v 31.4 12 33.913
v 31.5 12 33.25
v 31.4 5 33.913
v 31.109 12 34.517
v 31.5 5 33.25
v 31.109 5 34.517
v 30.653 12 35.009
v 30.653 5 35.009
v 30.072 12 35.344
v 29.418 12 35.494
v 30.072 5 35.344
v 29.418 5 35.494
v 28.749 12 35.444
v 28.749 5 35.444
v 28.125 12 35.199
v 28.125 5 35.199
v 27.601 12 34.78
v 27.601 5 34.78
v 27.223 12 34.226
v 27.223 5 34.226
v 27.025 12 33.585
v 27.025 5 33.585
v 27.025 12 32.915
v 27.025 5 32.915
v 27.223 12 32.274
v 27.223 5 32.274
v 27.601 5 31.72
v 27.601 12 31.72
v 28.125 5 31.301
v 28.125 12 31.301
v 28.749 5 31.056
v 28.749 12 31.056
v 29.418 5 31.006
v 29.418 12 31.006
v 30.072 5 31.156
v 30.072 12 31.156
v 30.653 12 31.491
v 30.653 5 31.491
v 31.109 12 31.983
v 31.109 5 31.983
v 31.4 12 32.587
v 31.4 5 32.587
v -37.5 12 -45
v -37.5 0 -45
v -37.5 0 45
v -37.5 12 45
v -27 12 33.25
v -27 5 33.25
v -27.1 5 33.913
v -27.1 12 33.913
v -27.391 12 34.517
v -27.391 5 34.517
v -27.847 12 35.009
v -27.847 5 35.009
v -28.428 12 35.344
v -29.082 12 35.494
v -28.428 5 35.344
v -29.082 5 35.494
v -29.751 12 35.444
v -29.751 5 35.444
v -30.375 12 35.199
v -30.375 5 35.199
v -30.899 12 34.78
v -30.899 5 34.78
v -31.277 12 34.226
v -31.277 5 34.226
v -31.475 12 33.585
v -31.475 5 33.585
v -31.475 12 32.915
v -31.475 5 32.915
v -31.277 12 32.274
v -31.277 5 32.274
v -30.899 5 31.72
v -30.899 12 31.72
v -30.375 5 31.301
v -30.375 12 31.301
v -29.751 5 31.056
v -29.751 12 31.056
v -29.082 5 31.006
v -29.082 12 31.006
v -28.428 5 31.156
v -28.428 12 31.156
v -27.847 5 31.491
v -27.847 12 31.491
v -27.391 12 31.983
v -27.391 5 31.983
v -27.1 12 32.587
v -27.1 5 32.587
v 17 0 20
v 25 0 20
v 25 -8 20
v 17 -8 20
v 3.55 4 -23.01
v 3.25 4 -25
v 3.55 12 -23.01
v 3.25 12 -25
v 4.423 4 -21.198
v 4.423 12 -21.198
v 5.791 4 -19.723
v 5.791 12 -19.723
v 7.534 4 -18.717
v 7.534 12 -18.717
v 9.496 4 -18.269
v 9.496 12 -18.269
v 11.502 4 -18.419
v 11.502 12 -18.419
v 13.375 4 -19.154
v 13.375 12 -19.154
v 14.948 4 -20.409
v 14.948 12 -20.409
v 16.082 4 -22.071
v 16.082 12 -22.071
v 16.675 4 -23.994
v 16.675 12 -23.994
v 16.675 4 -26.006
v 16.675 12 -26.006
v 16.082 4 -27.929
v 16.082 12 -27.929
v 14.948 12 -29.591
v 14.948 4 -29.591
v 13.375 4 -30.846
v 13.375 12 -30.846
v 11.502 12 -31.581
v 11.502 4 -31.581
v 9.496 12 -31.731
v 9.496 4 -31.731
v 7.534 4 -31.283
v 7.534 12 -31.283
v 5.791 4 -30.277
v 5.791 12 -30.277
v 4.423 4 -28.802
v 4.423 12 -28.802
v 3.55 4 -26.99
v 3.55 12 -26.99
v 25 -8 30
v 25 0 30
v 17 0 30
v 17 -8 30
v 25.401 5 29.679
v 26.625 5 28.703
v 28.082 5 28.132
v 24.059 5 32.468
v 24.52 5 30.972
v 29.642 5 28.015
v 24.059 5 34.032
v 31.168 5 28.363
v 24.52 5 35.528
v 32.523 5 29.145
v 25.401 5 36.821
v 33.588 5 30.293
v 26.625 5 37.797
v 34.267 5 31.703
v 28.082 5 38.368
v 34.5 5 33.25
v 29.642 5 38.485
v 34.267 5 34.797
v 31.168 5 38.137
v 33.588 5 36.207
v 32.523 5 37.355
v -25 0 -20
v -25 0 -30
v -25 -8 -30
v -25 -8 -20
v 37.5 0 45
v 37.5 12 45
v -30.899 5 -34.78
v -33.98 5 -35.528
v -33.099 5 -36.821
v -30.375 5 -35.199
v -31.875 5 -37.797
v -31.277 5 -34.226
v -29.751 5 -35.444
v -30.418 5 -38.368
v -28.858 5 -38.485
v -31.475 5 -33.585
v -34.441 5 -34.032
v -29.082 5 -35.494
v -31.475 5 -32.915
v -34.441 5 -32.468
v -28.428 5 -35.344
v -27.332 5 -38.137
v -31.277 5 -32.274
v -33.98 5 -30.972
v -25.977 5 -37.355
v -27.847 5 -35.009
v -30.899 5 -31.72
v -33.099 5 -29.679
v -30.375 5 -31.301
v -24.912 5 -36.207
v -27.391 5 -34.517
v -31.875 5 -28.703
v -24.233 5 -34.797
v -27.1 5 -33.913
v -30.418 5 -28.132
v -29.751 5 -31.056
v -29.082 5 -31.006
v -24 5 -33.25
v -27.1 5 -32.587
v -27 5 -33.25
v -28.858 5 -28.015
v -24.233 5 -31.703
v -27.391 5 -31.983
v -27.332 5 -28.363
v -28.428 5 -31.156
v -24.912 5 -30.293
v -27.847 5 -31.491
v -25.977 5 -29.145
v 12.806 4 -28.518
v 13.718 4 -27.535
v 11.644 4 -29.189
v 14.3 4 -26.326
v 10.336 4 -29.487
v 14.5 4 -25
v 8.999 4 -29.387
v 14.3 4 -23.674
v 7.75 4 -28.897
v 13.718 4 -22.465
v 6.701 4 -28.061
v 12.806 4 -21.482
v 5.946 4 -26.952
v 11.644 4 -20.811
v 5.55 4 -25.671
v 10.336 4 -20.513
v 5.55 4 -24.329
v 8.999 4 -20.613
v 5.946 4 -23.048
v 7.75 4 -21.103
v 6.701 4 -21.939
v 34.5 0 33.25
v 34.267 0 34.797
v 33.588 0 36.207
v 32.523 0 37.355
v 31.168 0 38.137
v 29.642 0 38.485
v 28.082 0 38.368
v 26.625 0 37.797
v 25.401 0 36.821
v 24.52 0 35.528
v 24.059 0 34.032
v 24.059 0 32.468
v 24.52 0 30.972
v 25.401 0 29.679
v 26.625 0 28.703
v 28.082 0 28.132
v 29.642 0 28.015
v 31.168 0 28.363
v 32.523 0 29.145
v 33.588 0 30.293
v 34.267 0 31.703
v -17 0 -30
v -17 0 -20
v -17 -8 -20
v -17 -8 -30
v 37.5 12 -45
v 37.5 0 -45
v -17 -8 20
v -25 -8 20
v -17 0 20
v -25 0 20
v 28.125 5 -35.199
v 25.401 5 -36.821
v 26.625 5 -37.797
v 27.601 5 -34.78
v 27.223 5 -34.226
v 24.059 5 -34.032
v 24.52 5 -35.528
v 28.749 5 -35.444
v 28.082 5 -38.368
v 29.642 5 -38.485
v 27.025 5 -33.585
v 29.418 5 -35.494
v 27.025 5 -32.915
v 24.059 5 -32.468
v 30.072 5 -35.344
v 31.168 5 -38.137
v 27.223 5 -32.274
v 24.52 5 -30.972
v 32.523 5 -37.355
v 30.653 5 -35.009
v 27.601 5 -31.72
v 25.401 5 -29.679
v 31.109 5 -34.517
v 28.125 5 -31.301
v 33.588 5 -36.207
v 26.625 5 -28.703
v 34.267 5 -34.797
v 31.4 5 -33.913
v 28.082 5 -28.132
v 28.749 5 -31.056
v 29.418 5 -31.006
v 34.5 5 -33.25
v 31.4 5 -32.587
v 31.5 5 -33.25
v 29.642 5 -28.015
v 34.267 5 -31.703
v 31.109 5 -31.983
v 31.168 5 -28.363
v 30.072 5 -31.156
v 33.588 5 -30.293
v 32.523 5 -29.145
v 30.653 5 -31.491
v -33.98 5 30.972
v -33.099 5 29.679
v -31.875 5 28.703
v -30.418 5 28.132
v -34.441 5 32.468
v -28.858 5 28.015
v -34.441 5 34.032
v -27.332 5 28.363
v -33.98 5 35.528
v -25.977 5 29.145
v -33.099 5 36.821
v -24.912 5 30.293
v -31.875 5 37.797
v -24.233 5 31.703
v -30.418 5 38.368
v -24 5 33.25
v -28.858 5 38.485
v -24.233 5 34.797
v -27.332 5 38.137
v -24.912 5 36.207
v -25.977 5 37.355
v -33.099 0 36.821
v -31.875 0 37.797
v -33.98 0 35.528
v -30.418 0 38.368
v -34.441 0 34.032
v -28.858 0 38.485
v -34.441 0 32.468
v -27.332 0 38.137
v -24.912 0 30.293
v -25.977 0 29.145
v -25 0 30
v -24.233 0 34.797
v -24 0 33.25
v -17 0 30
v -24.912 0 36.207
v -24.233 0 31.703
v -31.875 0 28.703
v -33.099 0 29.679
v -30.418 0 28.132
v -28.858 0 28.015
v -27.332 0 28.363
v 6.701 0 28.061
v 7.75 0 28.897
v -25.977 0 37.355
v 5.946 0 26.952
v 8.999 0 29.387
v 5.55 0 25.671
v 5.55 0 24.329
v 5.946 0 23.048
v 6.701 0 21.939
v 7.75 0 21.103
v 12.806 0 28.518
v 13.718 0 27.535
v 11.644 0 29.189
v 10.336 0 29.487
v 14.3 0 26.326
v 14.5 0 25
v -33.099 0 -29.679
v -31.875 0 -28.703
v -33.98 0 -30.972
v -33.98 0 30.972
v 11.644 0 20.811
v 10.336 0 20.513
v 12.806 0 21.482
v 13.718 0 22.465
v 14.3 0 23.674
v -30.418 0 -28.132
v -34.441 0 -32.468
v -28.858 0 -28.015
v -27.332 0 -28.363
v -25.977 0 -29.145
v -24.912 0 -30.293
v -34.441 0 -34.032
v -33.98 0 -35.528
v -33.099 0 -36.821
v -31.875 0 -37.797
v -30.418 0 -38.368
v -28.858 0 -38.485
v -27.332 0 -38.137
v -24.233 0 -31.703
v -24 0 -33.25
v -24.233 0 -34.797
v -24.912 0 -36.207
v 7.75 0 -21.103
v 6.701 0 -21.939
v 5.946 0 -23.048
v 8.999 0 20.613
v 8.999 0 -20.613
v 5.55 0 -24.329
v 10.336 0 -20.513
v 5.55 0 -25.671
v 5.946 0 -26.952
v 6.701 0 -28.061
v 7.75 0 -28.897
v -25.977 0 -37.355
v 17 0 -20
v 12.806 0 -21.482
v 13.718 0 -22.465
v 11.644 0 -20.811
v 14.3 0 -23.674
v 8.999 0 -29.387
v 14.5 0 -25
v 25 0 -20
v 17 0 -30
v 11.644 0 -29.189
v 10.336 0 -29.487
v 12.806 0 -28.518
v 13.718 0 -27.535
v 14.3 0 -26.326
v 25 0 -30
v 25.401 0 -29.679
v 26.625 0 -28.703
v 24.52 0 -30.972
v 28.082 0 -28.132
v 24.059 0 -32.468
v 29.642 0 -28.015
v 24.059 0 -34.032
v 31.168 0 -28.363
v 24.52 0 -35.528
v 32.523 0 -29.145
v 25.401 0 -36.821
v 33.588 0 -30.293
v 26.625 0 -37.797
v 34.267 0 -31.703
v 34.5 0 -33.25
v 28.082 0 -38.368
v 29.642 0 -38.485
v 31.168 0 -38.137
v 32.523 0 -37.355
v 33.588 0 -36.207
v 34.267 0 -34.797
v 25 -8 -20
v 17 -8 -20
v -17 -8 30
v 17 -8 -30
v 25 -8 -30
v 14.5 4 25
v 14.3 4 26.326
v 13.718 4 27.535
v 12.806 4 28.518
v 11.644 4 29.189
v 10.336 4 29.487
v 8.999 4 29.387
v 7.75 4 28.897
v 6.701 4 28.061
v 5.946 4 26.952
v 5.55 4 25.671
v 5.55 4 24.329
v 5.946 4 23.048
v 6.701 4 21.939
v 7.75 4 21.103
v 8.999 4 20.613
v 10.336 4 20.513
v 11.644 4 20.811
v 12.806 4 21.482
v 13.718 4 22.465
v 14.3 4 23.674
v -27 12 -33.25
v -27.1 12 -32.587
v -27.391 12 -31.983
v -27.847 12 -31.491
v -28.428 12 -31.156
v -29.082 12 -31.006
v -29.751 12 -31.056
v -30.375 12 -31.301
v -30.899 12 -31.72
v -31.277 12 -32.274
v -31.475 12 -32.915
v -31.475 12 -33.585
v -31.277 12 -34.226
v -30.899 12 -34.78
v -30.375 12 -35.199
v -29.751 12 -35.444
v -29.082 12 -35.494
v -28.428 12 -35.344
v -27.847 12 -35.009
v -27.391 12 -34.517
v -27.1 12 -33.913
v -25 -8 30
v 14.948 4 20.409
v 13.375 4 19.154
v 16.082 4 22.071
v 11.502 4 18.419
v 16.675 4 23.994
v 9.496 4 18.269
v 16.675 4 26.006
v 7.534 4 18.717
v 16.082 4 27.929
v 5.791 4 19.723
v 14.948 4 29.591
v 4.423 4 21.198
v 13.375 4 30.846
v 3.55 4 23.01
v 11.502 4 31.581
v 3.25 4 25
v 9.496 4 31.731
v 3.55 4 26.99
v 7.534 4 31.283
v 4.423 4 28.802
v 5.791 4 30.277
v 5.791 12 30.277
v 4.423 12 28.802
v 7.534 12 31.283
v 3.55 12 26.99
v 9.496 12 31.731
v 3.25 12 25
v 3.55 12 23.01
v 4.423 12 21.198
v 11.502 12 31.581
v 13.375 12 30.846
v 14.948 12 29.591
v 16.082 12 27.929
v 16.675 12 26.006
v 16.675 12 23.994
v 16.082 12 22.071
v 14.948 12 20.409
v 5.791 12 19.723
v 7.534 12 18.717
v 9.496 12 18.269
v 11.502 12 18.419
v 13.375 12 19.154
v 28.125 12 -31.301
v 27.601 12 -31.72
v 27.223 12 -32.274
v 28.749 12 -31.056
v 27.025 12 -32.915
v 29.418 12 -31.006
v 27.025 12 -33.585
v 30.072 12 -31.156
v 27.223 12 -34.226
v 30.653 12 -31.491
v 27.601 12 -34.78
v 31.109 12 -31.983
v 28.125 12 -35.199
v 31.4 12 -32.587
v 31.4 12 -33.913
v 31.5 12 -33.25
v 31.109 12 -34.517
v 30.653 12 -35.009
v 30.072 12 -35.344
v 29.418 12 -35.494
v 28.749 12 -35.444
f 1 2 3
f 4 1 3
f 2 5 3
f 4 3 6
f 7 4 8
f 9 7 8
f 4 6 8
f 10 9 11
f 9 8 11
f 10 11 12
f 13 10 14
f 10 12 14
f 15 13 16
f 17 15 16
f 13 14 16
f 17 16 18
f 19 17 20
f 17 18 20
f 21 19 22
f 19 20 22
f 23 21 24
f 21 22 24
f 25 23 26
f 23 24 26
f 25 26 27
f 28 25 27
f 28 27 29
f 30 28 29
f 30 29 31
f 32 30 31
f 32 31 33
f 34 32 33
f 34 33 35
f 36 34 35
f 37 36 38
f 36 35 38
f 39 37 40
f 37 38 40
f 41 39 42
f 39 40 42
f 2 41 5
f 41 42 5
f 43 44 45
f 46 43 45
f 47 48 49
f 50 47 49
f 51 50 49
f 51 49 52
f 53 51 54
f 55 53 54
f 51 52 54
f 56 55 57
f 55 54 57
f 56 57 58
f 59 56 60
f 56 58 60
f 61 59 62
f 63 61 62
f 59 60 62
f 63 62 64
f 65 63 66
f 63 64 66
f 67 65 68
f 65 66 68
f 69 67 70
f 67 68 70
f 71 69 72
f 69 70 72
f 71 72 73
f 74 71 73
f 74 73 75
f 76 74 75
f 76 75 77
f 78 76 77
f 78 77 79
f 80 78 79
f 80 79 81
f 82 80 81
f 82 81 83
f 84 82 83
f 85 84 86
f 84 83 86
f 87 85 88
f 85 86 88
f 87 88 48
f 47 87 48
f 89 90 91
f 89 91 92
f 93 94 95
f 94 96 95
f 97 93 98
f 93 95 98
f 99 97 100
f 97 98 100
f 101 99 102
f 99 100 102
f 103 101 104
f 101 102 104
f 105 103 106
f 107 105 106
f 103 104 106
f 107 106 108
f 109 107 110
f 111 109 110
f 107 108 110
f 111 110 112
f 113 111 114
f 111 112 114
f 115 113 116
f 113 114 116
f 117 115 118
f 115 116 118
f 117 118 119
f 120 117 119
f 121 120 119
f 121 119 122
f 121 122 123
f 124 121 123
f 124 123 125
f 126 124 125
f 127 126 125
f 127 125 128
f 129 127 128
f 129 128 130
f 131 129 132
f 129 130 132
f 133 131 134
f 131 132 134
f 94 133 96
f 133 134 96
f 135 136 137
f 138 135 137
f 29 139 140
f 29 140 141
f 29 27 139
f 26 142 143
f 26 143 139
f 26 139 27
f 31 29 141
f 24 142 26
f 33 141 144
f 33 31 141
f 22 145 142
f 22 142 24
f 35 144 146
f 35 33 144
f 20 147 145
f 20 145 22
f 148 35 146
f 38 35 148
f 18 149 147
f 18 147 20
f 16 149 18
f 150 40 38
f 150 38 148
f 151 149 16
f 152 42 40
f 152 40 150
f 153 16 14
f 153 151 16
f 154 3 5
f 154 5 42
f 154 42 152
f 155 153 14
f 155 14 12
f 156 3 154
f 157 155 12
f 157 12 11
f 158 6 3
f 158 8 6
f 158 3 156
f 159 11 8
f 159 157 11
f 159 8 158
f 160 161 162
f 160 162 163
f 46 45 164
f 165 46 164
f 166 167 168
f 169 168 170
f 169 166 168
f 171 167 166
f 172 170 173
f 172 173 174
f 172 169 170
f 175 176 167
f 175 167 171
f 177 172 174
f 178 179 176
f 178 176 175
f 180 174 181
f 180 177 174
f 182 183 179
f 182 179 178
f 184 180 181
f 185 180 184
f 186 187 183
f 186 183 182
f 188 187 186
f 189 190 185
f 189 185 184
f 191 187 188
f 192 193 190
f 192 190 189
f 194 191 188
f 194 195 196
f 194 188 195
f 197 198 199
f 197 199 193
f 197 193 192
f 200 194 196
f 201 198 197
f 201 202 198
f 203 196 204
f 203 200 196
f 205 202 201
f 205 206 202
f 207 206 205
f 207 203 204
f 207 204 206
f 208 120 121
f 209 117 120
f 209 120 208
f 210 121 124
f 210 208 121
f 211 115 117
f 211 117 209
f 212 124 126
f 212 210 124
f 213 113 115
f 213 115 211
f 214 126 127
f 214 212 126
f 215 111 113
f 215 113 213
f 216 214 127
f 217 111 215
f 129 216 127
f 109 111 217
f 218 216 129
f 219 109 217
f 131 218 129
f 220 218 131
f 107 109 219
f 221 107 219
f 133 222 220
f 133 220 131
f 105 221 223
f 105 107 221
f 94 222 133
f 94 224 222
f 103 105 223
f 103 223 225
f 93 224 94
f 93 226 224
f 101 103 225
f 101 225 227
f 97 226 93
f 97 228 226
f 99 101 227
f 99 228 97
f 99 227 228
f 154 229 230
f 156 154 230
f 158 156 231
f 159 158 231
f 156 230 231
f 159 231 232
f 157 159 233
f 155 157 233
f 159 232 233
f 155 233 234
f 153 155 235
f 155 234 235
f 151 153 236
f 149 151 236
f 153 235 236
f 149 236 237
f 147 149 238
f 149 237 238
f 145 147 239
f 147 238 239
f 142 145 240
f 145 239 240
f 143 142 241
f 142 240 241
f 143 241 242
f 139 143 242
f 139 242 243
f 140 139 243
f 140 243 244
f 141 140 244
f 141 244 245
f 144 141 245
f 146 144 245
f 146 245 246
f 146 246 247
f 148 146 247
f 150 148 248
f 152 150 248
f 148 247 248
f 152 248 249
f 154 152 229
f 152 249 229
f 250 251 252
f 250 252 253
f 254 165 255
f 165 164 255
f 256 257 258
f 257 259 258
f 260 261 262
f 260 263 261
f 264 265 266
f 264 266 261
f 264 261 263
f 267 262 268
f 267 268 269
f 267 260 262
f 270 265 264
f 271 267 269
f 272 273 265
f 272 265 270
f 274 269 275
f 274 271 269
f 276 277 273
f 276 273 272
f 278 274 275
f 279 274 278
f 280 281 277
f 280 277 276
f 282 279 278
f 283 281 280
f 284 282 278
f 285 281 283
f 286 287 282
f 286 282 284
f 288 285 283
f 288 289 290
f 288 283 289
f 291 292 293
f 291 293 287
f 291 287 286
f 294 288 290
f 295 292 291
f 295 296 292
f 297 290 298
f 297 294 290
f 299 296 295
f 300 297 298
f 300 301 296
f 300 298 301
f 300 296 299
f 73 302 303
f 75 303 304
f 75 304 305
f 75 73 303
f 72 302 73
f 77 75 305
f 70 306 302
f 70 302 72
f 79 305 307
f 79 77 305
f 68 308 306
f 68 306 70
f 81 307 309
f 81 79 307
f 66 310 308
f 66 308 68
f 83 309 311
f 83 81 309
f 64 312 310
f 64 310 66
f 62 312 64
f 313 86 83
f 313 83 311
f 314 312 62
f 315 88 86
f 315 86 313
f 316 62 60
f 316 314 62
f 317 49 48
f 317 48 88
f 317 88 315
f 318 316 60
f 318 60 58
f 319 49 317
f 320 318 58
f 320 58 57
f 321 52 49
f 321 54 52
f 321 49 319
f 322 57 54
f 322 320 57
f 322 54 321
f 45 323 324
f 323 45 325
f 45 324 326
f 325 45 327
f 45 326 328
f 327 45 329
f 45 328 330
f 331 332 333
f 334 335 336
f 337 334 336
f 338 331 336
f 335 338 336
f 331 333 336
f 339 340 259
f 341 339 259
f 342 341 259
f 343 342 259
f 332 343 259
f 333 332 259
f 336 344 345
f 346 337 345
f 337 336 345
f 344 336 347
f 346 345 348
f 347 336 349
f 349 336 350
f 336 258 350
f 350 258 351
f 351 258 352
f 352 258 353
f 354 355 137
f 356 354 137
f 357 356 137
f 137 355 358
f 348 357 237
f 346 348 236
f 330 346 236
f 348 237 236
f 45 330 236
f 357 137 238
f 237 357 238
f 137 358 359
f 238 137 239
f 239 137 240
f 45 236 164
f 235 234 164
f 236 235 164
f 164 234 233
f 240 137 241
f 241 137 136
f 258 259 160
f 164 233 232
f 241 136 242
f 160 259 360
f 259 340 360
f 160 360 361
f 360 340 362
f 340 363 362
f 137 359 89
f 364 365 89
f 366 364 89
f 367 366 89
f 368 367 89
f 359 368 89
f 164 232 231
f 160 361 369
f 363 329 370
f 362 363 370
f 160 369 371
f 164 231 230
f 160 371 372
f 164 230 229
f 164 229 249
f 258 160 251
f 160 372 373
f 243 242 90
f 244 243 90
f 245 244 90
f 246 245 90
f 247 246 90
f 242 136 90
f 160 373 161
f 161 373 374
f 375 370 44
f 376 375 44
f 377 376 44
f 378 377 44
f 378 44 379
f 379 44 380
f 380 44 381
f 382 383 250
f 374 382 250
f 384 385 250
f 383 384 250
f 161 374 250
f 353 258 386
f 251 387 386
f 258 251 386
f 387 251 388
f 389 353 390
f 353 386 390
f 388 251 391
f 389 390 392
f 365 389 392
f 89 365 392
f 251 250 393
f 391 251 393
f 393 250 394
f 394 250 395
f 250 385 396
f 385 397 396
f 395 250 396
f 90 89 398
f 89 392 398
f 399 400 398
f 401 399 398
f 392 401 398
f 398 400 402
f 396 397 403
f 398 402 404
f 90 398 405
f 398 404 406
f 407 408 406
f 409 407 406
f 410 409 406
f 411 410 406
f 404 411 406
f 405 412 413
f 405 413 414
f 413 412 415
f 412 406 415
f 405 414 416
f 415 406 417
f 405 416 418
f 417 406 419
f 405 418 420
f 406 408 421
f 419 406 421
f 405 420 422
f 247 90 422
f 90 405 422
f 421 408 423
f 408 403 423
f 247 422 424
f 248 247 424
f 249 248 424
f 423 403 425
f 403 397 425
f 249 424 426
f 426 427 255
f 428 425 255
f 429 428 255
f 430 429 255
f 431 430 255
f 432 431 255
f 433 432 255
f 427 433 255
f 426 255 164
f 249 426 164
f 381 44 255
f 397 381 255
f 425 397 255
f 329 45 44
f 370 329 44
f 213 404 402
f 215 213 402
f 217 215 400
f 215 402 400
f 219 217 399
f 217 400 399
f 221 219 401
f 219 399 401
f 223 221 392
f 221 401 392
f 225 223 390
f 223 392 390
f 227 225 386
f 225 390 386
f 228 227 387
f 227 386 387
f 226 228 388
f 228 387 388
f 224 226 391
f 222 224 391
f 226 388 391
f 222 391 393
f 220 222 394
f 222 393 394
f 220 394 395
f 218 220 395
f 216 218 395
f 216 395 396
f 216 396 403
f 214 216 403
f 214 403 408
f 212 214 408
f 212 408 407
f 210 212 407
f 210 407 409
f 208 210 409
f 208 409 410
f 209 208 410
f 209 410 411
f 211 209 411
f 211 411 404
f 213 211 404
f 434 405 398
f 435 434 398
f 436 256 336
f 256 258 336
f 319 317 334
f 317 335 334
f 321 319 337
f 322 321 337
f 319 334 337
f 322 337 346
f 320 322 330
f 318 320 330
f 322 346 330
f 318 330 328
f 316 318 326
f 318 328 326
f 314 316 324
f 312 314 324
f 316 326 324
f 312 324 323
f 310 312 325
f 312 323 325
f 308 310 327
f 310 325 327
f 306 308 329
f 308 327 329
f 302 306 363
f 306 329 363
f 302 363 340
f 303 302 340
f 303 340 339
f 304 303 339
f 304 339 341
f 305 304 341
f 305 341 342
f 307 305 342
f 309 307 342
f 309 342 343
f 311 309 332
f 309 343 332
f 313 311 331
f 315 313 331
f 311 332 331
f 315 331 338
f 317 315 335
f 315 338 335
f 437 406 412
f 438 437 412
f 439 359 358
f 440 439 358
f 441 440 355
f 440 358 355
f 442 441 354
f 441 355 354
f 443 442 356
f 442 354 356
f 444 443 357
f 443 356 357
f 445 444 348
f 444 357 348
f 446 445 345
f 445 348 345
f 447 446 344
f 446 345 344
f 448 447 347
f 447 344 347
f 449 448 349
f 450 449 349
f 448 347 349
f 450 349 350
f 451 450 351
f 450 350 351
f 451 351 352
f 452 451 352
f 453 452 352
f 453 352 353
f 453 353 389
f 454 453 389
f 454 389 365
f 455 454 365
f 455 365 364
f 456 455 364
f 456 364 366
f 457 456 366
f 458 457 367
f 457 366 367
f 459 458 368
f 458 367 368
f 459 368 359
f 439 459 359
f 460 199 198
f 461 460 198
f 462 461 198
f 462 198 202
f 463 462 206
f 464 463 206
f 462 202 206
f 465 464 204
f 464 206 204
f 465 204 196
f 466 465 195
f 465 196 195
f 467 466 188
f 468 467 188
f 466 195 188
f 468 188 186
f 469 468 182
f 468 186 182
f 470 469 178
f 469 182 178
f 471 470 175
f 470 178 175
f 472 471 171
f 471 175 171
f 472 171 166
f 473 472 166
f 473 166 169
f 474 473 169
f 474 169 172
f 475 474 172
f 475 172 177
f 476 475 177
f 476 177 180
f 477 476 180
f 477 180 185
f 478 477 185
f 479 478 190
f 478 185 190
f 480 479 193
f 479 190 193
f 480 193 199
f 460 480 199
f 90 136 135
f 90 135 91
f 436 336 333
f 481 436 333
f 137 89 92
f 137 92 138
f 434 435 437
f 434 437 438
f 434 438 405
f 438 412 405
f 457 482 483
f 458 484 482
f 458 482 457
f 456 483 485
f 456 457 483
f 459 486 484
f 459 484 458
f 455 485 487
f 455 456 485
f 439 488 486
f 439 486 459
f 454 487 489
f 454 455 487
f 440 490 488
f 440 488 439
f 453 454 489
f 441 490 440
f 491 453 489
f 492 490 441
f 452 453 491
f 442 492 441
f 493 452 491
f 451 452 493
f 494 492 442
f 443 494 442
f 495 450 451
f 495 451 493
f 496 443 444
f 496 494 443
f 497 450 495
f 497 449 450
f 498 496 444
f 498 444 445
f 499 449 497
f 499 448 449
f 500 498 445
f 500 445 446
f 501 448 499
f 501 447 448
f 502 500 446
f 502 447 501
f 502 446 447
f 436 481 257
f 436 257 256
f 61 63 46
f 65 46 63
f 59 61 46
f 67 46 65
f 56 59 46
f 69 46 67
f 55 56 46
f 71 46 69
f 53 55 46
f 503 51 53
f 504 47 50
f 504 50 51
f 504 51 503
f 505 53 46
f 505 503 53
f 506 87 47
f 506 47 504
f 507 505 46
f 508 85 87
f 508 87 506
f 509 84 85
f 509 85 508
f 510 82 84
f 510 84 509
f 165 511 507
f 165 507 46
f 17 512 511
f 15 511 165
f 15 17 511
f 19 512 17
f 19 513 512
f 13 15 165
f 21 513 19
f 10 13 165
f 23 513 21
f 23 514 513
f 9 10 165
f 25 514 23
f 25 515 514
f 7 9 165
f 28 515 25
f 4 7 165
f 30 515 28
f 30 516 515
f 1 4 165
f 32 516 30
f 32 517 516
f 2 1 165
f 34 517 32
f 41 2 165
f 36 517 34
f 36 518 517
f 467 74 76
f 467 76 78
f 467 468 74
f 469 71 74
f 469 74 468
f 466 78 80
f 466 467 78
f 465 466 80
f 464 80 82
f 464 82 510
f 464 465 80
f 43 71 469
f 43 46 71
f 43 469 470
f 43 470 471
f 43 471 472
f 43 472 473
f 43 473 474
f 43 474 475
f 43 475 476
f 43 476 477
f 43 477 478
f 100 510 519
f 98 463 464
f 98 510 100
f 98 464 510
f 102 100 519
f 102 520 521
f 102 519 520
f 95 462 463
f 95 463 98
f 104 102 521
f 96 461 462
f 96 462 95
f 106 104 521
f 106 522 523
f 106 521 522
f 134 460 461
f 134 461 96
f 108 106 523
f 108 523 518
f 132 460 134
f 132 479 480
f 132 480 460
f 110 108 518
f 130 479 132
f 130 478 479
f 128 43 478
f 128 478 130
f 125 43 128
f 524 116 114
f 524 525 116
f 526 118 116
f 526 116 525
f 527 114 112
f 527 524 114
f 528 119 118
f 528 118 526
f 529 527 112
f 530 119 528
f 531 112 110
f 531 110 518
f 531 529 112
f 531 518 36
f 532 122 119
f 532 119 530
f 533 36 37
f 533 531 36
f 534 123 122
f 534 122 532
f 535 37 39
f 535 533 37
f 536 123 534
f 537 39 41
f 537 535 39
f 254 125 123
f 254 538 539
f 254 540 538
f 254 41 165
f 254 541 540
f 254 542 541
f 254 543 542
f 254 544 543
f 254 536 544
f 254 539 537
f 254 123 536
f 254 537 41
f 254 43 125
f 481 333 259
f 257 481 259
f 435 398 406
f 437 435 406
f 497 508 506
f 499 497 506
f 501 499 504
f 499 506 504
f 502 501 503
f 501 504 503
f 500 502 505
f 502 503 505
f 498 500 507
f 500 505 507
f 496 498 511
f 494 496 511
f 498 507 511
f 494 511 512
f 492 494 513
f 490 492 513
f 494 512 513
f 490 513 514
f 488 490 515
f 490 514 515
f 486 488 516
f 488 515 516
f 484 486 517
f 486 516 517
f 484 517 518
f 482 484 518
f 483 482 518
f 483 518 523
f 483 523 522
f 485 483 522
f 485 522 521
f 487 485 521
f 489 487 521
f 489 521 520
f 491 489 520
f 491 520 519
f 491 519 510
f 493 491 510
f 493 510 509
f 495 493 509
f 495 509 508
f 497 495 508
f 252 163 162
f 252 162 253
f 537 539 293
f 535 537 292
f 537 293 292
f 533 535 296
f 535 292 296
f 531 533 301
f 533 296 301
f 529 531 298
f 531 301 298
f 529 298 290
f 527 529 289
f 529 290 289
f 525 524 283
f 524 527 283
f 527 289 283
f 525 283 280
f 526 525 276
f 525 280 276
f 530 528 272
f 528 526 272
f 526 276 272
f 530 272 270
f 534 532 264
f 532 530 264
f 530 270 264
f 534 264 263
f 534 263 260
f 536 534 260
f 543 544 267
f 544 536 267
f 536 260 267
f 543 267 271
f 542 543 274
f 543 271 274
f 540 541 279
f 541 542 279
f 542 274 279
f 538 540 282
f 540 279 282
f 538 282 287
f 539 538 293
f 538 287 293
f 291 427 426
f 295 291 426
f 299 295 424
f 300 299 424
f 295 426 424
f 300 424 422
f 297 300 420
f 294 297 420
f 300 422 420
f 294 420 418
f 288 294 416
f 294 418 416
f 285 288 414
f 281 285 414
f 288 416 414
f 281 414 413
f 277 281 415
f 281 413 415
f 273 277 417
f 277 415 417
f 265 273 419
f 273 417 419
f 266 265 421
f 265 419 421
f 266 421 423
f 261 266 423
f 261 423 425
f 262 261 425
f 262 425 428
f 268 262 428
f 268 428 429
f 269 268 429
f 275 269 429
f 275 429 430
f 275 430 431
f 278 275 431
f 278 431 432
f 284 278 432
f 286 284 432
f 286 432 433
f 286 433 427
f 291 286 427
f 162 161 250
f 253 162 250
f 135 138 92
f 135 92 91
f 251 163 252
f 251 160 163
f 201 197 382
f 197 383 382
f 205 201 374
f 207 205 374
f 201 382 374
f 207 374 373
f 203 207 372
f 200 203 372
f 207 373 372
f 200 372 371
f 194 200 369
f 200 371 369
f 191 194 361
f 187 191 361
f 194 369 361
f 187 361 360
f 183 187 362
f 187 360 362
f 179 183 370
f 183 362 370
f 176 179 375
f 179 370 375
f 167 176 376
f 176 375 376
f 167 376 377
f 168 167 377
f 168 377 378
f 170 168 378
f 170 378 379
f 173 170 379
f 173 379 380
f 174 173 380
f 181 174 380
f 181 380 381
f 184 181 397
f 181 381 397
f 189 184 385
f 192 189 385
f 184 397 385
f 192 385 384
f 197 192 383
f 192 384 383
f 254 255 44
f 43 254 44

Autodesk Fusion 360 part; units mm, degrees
sketch "Sketch1" plane through (0, 0, 0) normal (0, 1, 0) x (1, 0, 0)
  line L0 (29.25, 33.25) -> (-29.25, 33.25)
  line L1 (-29.25, 33.25) -> (-29.25, -33.25)
  line L2 (-29.25, -33.25) -> (29.25, -33.25)
  line L3 (29.25, -33.25) -> (29.25, 33.25)
  line L4 (29.25, 33.25) -> (-29.25, -33.25) construction
  line L5 (-29.25, 33.25) -> (29.25, -33.25) construction
  circle A0 centre (-29.25, -33.25) radius 2.25
  circle A1 centre (29.25, -33.25) radius 2.25
  circle A2 centre (-29.25, 33.25) radius 2.25
  circle A3 centre (29.25, 33.25) radius 2.25
  line L6 (37.5, 45) -> (-37.5, 45)
  line L7 (-37.5, 45) -> (-37.5, -45)
  line L8 (-37.5, -45) -> (37.5, -45)
  line L9 (37.5, -45) -> (37.5, 45)
  line L10 (37.5, 45) -> (-37.5, -45) construction
  line L11 (-37.5, 45) -> (37.5, -45) construction
  dimension "d1" = 58.5
  dimension "d2" = 66.5
  dimension "d3" = 4.5
  dimension "d4" = 4.5
  dimension "d5" = 4.5
  dimension "d6" = 4.5
  dimension "d7" = 75
  dimension "d8" = 90
extrude "Extrude1" add sketch "Sketch1" along normal blind 12 contours L0 L1 L2 L3 A0 A1 A2 A3 | L6 L7 L8 L9
sketch "Sketch2" plane through (0, 0, 0) normal (0, -1, 0) x (1, 0, 0)
  circle A0 centre (29.25, -33.25) radius 2.25
  circle A1 centre (-29.25, 33.25) radius 2.25
  circle A2 centre (-29.25, -33.25) radius 2.25
  circle A3 centre (29.25, 33.25) radius 2.25
  line L0 (37.5, -45) -> (37.5, 45)
  line L1 (37.5, 45) -> (-37.5, 45)
  line L2 (-37.5, 45) -> (-37.5, -45)
  line L3 (-37.5, -45) -> (37.5, -45)
  line L4 (-35, -30) -> (35, -30)
  line L5 (35, -30) -> (35, 30)
  line L6 (35, 30) -> (-35, 30)
  line L7 (-35, 30) -> (-35, -30)
  line L8 (-35, -30) -> (35, 30) construction
  line L9 (35, -30) -> (-35, 30) construction
  line L10 (-25, -20) -> (-17, -20)
  line L11 (-17, -20) -> (-17, -30)
  line L12 (-17, -30) -> (-25, -30)
  line L13 (-25, -30) -> (-25, -20)
  line L14 (25, -20) -> (17, -20)
  line L15 (17, -20) -> (17, -30)
  line L16 (17, -30) -> (25, -30)
  line L17 (25, -30) -> (25, -20)
  line L18 (25, 20) -> (17, 20)
  line L19 (17, 20) -> (17, 30)
  line L20 (17, 30) -> (25, 30)
  line L21 (25, 30) -> (25, 20)
  line L22 (-25, 20) -> (-17, 20)
  line L23 (-17, 20) -> (-17, 30)
  line L24 (-17, 30) -> (-25, 30)
  line L25 (-25, 30) -> (-25, 20)
  circle A4 centre (10, -25) radius 4.5
  circle A5 centre (-10, -25) radius 4.5
  circle A6 centre (10, 25) radius 4.5
  circle A7 centre (-10, 25) radius 4.5
  dimension "d11" = 60
  dimension "d25" = 8
  dimension "d26" = 8
  dimension "d27" = 8
  dimension "d28" = 8
  dimension "d29" = 9
  dimension "d30" = 9
  dimension "d31" = 9
  dimension "d32" = 9
extrude "Extrude2" add sketch "Sketch2" along normal blind 8 contours L4 L10 L11 L12 L13 | L6 L22 L23 L24 L25 | L4 L14 L15 L16 L17 | L6 L18 L19 L20 L21
sketch "Sketch3" plane through (0, 0, 0) normal (0, -1, 0) x (1, 0, 0)
  line L0 (-25, 30) -> (-17, 30)
  line L1 (25, -30) -> (17, -30)
  line L2 (37.5, -45) -> (37.5, 45)
  line L3 (-37.5, 45) -> (-37.5, -45)
  line L4 (-17, 30) -> (-17, 20)
  line L5 (-17, 20) -> (-25, 20)
  line L6 (-25, 20) -> (-25, 30)
  line L7 (17, -30) -> (17, -20)
  line L8 (17, -20) -> (25, -20)
  line L9 (25, -20) -> (25, -30)
  line L10 (25, 30) -> (25, 20)
  line L11 (25, 20) -> (17, 20)
  line L12 (17, 20) -> (17, 30)
  line L13 (17, 30) -> (25, 30)
  line L14 (-25, -30) -> (-25, -20)
  line L15 (-25, -20) -> (-17, -20)
  line L16 (-17, -20) -> (-17, -30)
  line L17 (-17, -30) -> (-25, -30)
  line L18 (37.5, 45) -> (-37.5, 45)
  line L19 (-37.5, -45) -> (37.5, -45)
  circle A0 centre (29.25, 33.25) radius 2.25
  circle A1 centre (29.25, -33.25) radius 2.25
  circle A2 centre (-29.25, 33.25) radius 2.25
  circle A3 centre (-29.25, -33.25) radius 2.25
  circle A4 centre (29.25, -33.25) radius 5.25
  circle A5 centre (-29.25, -33.25) radius 5.25
  circle A6 centre (-29.25, 33.25) radius 5.25
  circle A7 centre (29.25, 33.25) radius 5.25
  dimension "d41" = 10.5
  dimension "d42" = 10.5
  dimension "d43" = 10.5
  dimension "d44" = 10.5
sketch "Sketch4" plane through (0, 0, 0) normal (0, -1, 0) x (1, 0, 0)
  line L0 (-37.5, 45) -> (-37.5, -45)
  line L1 (25, -30) -> (17, -30)
  line L2 (17, 30) -> (25, 30)
  line L3 (-37.5, -45) -> (37.5, -45)
  line L4 (17, -30) -> (17, -20)
  line L5 (17, -20) -> (25, -20)
  line L6 (25, -20) -> (25, -30)
  line L7 (25, 30) -> (25, 20)
  line L8 (25, 20) -> (17, 20)
  line L9 (17, 20) -> (17, 30)
  line L10 (37.5, -45) -> (37.5, 45)
  line L11 (37.5, 45) -> (-37.5, 45)
  line L12 (-17, 30) -> (-17, 20)
  line L13 (-17, 20) -> (-25, 20)
  line L14 (-25, 20) -> (-25, 30)
  line L15 (-25, -30) -> (-25, -20)
  line L16 (-25, -20) -> (-17, -20)
  line L17 (-17, -20) -> (-17, -30)
  line L18 (-17, -30) -> (-25, -30)
  line L19 (-25, 30) -> (-17, 30)
  circle A0 centre (29.25, 33.25) radius 2.25
  circle A1 centre (-29.25, 33.25) radius 2.25
  circle A2 centre (-29.25, -33.25) radius 2.25
  circle A3 centre (29.25, -33.25) radius 2.25
sketch "Sketch5" plane through (0, 12, 0) normal (0, 1, 0) x (-1, 0, 0)
  circle A0 centre (-29.25, 33.25) radius 2.25
  circle A1 centre (-29.25, -33.25) radius 2.25
  circle A2 centre (29.25, 33.25) radius 2.25
  circle A3 centre (29.25, -33.25) radius 2.25
  line L0 (-37.5, 45) -> (-37.5, -45)
  line L1 (-37.5, -45) -> (37.5, -45)
  line L2 (37.5, -45) -> (37.5, 45)
  line L3 (37.5, 45) -> (-37.5, 45)
  circle A4 centre (10, -25) radius 6.75
  circle A5 centre (-10, -25) radius 6.75
  circle A6 centre (10, 25) radius 6.75
  circle A7 centre (-10, 25) radius 6.75
  dimension "d33" = 13.5
  dimension "d34" = 13.5
  dimension "d35" = 13.5
  dimension "d36" = 13.5
extrude "Extrude4" cut sketch "Sketch5" against normal blind 8 contours A5 | A7
extrude "Extrude5" cut sketch "Sketch2" against normal blind 16 contours A4 | A6
extrude "Extrude6" cut sketch "Sketch3" against normal blind 5 contours A4 | A5 | A6 | A7
